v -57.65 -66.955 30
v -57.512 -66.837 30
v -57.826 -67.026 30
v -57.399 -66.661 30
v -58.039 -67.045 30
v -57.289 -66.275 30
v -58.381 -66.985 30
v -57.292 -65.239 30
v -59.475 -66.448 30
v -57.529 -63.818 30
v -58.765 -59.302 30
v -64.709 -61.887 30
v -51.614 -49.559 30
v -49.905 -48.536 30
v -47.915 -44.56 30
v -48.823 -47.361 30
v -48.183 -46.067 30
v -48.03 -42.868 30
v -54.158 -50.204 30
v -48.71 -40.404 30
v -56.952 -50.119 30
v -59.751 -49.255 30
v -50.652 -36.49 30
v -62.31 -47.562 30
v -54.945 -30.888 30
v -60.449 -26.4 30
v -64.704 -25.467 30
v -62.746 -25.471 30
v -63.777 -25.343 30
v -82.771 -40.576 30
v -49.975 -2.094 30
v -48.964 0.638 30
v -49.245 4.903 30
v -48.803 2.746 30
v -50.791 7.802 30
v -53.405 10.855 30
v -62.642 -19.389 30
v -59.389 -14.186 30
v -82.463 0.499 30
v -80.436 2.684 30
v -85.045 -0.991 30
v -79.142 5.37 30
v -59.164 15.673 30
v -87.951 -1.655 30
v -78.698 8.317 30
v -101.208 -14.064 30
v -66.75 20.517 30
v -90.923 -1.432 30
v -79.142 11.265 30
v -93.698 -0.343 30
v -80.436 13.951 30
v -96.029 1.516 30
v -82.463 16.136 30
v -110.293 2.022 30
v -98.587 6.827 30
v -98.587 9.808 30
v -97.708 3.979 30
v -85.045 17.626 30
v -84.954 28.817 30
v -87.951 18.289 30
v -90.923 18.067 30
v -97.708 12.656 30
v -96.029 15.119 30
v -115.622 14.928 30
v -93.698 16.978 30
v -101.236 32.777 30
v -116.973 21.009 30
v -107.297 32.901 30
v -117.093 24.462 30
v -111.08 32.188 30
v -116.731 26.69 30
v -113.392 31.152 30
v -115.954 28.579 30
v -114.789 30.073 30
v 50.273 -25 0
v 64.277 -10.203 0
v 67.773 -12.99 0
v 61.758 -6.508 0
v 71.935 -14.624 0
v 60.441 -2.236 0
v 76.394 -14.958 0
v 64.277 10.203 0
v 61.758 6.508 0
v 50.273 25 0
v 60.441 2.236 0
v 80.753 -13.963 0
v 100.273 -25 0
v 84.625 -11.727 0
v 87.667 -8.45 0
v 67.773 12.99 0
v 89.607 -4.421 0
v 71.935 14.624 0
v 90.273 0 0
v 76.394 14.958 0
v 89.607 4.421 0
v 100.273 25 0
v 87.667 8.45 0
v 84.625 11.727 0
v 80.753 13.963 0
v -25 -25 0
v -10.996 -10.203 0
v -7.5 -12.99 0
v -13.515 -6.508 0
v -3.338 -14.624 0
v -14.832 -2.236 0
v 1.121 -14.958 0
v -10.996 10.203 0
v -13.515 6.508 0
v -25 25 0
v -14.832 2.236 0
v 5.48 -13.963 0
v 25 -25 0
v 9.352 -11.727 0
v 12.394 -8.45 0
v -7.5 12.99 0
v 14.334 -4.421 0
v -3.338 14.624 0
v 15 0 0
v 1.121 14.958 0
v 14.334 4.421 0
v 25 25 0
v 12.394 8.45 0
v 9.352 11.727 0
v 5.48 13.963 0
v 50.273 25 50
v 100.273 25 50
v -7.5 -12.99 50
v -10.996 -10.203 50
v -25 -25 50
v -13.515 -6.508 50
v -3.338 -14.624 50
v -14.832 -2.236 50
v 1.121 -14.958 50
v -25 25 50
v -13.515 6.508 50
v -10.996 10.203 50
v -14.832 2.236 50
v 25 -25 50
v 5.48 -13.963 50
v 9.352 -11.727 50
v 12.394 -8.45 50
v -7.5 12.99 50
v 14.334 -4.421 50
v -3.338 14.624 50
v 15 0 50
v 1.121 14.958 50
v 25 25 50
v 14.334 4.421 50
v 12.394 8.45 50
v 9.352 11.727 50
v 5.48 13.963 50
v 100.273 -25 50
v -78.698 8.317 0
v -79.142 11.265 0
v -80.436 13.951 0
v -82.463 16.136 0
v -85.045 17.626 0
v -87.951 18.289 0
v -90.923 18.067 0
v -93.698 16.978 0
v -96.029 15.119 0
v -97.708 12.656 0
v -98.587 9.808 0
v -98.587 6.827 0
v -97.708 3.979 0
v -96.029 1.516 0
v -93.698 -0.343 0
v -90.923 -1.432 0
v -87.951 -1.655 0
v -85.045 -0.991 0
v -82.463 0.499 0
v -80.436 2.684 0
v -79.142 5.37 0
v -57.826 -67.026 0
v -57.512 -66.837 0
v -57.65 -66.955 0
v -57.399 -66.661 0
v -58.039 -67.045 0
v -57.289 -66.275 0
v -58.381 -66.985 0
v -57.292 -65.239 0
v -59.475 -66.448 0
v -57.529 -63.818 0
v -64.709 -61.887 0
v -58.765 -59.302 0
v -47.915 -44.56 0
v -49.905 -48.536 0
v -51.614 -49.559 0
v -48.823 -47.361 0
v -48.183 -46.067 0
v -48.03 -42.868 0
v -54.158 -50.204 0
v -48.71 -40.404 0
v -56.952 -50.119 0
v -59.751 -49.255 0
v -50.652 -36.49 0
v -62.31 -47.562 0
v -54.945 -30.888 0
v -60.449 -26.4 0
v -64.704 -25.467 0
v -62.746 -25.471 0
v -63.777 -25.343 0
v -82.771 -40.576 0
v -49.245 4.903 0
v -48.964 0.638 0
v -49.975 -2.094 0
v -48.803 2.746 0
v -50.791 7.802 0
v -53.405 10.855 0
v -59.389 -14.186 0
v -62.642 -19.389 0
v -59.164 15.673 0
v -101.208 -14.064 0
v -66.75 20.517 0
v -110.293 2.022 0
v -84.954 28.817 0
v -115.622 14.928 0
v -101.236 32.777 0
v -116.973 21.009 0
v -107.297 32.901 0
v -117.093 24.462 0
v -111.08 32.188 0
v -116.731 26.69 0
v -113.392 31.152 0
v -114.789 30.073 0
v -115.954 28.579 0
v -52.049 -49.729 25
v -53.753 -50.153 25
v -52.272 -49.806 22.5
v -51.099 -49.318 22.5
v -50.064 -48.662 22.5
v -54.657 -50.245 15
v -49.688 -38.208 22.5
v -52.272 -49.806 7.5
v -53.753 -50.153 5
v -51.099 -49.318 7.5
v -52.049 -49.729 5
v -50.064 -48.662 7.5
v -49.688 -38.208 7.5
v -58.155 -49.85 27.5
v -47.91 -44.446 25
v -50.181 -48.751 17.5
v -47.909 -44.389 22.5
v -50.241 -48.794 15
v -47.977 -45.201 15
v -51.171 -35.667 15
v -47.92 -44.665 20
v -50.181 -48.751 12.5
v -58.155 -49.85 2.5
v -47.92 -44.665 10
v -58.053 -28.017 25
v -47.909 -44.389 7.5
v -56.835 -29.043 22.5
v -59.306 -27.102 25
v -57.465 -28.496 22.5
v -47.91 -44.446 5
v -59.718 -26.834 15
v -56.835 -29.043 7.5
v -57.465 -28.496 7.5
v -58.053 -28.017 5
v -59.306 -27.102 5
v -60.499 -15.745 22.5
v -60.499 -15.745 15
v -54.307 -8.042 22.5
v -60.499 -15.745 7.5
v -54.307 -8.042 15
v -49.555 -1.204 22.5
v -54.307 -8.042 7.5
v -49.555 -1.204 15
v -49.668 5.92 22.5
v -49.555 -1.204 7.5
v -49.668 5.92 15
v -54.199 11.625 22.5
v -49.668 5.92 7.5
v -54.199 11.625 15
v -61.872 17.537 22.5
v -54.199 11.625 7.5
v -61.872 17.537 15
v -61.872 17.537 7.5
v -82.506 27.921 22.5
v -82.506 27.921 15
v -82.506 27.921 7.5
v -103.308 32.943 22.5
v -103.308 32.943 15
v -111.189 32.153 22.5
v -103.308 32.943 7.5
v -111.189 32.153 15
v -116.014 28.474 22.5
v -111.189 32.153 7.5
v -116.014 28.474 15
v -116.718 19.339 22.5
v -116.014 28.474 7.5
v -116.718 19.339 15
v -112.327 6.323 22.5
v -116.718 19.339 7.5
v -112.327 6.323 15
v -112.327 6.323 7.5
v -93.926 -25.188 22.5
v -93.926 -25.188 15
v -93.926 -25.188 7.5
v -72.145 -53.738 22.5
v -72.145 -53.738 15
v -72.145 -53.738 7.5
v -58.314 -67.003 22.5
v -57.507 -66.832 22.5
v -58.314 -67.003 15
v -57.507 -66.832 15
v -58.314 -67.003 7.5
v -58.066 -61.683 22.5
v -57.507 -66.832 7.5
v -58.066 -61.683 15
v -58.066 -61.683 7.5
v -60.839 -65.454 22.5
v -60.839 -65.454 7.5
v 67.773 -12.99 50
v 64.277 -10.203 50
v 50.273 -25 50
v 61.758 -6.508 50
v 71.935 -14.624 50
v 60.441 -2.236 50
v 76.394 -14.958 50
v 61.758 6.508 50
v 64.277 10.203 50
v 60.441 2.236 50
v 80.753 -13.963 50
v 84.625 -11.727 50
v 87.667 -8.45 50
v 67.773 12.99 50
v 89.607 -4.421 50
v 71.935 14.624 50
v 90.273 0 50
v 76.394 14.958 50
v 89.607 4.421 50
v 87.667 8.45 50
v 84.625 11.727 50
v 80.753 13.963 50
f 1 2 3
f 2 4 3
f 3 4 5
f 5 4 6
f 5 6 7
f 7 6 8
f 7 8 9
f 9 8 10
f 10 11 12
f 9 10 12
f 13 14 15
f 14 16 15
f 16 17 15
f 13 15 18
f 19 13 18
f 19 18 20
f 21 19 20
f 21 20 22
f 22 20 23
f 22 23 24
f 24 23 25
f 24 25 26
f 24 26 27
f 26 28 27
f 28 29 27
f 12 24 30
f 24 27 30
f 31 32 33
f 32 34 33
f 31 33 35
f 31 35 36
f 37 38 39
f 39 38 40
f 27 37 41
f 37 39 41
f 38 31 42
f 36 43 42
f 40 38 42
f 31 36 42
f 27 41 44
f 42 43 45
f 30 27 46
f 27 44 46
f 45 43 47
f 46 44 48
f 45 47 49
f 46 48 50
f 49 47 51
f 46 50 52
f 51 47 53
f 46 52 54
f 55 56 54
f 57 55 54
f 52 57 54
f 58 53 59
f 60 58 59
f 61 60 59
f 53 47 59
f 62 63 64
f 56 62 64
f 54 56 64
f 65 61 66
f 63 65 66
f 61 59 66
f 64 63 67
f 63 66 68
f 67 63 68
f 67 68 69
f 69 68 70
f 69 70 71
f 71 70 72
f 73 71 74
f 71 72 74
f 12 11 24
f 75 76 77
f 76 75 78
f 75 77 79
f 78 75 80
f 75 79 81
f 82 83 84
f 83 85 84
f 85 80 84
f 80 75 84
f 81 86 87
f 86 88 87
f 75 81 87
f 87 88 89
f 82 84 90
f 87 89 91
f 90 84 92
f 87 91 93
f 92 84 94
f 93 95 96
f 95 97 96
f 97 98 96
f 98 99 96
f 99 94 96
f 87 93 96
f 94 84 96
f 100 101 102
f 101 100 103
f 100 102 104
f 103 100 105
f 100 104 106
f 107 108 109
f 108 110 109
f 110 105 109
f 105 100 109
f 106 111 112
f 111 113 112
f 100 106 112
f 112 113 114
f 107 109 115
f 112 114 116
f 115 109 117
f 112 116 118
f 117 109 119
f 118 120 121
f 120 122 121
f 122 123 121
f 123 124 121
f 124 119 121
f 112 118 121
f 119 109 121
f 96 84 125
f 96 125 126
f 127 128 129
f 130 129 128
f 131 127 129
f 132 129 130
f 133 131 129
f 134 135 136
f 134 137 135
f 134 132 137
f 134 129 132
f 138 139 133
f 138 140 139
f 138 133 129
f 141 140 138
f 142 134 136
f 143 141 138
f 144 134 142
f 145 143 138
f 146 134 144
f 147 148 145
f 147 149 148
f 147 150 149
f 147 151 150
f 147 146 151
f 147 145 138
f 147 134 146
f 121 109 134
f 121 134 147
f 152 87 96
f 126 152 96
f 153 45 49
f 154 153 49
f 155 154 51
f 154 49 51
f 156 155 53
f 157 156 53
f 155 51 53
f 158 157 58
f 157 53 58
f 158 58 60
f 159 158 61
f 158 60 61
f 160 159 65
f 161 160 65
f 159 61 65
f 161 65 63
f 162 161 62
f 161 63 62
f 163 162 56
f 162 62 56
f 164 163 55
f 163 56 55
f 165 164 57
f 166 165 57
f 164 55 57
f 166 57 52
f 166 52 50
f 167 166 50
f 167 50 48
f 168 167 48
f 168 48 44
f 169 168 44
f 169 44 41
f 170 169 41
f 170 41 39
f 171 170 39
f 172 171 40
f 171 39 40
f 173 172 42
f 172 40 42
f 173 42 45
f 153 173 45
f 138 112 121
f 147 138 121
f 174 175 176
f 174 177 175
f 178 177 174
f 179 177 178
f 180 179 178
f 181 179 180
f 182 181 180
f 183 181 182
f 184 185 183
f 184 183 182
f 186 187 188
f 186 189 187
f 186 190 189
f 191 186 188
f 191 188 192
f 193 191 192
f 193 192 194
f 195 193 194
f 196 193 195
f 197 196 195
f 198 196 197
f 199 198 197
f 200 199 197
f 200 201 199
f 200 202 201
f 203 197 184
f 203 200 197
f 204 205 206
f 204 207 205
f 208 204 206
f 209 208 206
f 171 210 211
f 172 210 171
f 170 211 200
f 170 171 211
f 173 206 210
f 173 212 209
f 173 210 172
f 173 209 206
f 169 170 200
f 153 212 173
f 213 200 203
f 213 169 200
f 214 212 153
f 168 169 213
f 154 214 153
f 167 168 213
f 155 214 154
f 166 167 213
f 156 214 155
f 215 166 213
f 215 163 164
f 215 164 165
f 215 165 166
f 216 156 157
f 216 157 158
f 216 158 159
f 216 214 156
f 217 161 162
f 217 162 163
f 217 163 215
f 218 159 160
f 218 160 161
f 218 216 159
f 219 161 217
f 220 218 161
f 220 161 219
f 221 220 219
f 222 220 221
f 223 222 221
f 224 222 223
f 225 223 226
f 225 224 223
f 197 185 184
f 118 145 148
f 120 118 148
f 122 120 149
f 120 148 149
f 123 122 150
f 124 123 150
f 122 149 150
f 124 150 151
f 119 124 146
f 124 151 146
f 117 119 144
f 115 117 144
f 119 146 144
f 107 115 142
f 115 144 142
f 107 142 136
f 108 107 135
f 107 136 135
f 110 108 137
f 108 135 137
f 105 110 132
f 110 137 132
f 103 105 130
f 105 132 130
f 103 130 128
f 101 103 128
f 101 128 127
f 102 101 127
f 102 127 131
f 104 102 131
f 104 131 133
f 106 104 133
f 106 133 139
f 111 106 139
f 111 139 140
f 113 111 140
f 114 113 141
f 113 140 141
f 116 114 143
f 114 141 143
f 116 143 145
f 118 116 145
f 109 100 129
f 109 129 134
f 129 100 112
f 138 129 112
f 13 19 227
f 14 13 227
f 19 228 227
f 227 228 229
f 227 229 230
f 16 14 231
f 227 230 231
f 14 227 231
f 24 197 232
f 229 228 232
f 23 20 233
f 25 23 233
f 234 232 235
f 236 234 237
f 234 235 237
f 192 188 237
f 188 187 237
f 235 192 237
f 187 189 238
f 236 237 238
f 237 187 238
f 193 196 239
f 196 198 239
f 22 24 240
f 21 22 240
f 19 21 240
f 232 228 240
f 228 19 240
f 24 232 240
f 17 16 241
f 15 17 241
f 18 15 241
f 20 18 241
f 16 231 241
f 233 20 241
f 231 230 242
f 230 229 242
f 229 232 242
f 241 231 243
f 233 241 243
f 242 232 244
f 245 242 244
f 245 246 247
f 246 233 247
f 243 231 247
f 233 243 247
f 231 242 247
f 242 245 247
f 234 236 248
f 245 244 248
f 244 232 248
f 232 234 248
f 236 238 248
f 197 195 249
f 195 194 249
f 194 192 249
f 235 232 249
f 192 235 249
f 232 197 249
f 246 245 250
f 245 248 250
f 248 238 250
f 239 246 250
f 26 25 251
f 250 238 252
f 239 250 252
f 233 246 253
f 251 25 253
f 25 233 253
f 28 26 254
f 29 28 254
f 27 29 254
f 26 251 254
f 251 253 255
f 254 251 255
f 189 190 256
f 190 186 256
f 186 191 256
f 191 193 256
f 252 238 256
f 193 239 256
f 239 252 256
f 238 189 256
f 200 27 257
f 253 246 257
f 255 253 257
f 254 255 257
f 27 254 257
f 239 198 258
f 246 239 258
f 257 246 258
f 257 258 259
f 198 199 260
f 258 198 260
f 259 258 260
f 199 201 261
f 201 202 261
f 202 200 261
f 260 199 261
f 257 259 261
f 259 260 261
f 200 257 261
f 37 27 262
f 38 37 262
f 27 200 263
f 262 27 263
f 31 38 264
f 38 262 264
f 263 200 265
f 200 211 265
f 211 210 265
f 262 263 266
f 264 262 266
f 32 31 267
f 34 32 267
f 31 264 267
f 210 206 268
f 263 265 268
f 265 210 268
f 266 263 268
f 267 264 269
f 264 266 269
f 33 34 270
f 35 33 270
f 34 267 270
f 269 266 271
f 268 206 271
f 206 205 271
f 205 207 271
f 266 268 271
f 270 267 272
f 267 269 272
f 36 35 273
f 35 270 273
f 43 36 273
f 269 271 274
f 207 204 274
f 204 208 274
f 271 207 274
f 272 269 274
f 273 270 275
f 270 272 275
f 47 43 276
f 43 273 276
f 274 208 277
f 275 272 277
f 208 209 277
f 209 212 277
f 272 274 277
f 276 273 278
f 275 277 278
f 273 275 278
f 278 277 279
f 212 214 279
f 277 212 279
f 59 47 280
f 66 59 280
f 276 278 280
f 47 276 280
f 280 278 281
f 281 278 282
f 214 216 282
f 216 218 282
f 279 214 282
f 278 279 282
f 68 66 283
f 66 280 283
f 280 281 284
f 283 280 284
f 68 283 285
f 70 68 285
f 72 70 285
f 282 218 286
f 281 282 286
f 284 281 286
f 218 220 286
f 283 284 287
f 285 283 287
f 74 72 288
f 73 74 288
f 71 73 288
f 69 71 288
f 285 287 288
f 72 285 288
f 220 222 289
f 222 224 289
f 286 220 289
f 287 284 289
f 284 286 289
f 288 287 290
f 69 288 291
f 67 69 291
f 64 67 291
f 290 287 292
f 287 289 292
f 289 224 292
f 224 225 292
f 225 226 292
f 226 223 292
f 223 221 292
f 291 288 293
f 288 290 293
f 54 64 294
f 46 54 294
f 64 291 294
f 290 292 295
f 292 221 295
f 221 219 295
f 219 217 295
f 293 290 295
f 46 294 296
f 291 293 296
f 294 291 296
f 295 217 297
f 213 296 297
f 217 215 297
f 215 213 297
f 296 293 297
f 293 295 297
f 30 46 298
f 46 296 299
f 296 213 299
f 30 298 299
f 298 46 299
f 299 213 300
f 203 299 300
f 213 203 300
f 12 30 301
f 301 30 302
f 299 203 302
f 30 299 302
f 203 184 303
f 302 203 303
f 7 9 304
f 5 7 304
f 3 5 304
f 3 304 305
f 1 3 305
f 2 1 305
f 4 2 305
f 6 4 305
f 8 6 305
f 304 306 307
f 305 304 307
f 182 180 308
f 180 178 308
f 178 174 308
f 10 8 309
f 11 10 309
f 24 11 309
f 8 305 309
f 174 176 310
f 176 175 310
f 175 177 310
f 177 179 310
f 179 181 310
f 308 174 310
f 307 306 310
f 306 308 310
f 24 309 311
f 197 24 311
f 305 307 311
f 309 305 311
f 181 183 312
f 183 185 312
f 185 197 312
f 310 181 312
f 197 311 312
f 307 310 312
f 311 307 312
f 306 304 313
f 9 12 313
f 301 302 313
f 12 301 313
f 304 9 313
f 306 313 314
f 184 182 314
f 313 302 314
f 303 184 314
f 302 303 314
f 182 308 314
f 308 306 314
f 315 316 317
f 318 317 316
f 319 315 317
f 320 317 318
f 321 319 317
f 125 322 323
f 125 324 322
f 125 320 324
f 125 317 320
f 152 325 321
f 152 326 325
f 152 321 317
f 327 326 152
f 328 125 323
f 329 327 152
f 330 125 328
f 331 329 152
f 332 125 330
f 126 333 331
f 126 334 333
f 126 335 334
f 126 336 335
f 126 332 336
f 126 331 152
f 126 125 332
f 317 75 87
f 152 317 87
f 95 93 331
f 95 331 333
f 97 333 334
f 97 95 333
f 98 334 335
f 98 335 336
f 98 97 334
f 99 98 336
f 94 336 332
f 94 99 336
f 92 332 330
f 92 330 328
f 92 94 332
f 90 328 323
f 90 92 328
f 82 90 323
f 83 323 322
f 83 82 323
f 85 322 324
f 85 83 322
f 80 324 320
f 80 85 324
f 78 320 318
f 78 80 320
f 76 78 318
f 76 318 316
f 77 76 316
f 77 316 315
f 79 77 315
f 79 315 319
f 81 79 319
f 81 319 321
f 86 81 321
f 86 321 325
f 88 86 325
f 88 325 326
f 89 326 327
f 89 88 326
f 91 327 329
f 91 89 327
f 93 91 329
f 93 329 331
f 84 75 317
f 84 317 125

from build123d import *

# Parameters (mm, degrees)
F0_W     = 50
F0_H     = 50
F1_DEPTH = 50
F2_R     = 15
F3_DEPTH = 50
F4_W     = 50
F4_H     = 50
F4_R     = 15
F5_DEPTH = 50
F7_DEPTH = 30
F8_R     = 10
F9_DEPTH = 30


with BuildPart() as f1:
    # F0 (on Top) → F1 (new body)
    with BuildSketch(Plane.XY):
        Rectangle(F0_W, F0_H)
    extrude(amount=F1_DEPTH)

    # F2 (on face) → F3 (cut)
    with BuildSketch(Plane.XY.offset(50)):
        Circle(F2_R)
    extrude(amount=-F3_DEPTH, mode=Mode.SUBTRACT)


with BuildPart() as f5:
    # F4 (on Top) → F5 (new body)
    with BuildSketch(Plane.XY):
        with Locations((75.2729773521, 0)):
            Rectangle(F4_W, F4_H)
        with Locations((75.2729773521, 0)):
            Circle(F4_R, mode=Mode.SUBTRACT)
    extrude(amount=F5_DEPTH)


with BuildPart() as f7:
    # F6 (on Top) → F7 (new body)
    with BuildSketch(Plane.XY):
        with BuildLine():
            add(Edge.make_bspline(
                [(-64.7039115429, -25.4668872803), (-69.6835985804, -26.9424751558), (-68.5769154664, -41.9129153667), (-62.3095395677, -47.5621969519)],
                knots=[0.6536621063, 0.6536621063, 0.6536621063, 0.6536621063, 1, 1, 1, 1], degree=3))
            add(Edge.make_bspline(
                [(-64.7039115429, -25.4668872803), (-61.9442588341, -10.6474826983), (-20.3534218039, 4.751836798), (-173.1206274633, 70.604640196), (-44.5515628436, -92.7677922159), (-59.2984936588, -58.5539814373), (-62.3095395677, -47.5621969519)],
                knots=[0, 0, 0, 0, 0.1883873751, 0.4557026741, 0.7929863019, 0.9168854668, 0.9168854668, 0.9168854668, 0.9168854668], degree=3))
        make_face()
        with BuildLine():
            add(Edge.make_bspline(
                [(-62.3095395677, -47.5621969519), (-57.2426387105, -52.1293954365), (-37.5394746181, -48.5689596674), (-59.331341184, -23.8748796658), (-64.7039115429, -25.4668872803)],
                knots=[0, 0, 0, 0, 0.2799991255, 0.6536621063, 0.6536621063, 0.6536621063, 0.6536621063], degree=3))
            add(Edge.make_bspline(
                [(-62.3095395677, -47.5621969519), (-64.329421424, -40.1886441332), (-65.9214413619, -32.005053087), (-64.7039115429, -25.4668872803)],
                knots=[0.9168854668, 0.9168854668, 0.9168854668, 0.9168854668, 1, 1, 1, 1], degree=3))
        make_face()
        with BuildLine():
            add(Edge.make_bspline(
                [(-62.3095395677, -47.5621969519), (-64.329421424, -40.1886441332), (-65.9214413619, -32.005053087), (-64.7039115429, -25.4668872803)],
                knots=[0.9168854668, 0.9168854668, 0.9168854668, 0.9168854668, 1, 1, 1, 1], degree=3))
            add(Edge.make_bspline(
                [(-64.7039115429, -25.4668872803), (-69.6835985804, -26.9424751558), (-68.5769154664, -41.9129153667), (-62.3095395677, -47.5621969519)],
                knots=[0.6536621063, 0.6536621063, 0.6536621063, 0.6536621063, 1, 1, 1, 1], degree=3))
        make_face()
    extrude(amount=F7_DEPTH)

    # F8 (on face) → F9 (cut)
    with BuildSketch(Plane.XY.offset(30)):
        with Locations((-88.6982232332, 8.3174416795)):
            Circle(F8_R)
    extrude(amount=-F9_DEPTH, mode=Mode.SUBTRACT)


solid = Compound([f1.part, f5.part, f7.part])
